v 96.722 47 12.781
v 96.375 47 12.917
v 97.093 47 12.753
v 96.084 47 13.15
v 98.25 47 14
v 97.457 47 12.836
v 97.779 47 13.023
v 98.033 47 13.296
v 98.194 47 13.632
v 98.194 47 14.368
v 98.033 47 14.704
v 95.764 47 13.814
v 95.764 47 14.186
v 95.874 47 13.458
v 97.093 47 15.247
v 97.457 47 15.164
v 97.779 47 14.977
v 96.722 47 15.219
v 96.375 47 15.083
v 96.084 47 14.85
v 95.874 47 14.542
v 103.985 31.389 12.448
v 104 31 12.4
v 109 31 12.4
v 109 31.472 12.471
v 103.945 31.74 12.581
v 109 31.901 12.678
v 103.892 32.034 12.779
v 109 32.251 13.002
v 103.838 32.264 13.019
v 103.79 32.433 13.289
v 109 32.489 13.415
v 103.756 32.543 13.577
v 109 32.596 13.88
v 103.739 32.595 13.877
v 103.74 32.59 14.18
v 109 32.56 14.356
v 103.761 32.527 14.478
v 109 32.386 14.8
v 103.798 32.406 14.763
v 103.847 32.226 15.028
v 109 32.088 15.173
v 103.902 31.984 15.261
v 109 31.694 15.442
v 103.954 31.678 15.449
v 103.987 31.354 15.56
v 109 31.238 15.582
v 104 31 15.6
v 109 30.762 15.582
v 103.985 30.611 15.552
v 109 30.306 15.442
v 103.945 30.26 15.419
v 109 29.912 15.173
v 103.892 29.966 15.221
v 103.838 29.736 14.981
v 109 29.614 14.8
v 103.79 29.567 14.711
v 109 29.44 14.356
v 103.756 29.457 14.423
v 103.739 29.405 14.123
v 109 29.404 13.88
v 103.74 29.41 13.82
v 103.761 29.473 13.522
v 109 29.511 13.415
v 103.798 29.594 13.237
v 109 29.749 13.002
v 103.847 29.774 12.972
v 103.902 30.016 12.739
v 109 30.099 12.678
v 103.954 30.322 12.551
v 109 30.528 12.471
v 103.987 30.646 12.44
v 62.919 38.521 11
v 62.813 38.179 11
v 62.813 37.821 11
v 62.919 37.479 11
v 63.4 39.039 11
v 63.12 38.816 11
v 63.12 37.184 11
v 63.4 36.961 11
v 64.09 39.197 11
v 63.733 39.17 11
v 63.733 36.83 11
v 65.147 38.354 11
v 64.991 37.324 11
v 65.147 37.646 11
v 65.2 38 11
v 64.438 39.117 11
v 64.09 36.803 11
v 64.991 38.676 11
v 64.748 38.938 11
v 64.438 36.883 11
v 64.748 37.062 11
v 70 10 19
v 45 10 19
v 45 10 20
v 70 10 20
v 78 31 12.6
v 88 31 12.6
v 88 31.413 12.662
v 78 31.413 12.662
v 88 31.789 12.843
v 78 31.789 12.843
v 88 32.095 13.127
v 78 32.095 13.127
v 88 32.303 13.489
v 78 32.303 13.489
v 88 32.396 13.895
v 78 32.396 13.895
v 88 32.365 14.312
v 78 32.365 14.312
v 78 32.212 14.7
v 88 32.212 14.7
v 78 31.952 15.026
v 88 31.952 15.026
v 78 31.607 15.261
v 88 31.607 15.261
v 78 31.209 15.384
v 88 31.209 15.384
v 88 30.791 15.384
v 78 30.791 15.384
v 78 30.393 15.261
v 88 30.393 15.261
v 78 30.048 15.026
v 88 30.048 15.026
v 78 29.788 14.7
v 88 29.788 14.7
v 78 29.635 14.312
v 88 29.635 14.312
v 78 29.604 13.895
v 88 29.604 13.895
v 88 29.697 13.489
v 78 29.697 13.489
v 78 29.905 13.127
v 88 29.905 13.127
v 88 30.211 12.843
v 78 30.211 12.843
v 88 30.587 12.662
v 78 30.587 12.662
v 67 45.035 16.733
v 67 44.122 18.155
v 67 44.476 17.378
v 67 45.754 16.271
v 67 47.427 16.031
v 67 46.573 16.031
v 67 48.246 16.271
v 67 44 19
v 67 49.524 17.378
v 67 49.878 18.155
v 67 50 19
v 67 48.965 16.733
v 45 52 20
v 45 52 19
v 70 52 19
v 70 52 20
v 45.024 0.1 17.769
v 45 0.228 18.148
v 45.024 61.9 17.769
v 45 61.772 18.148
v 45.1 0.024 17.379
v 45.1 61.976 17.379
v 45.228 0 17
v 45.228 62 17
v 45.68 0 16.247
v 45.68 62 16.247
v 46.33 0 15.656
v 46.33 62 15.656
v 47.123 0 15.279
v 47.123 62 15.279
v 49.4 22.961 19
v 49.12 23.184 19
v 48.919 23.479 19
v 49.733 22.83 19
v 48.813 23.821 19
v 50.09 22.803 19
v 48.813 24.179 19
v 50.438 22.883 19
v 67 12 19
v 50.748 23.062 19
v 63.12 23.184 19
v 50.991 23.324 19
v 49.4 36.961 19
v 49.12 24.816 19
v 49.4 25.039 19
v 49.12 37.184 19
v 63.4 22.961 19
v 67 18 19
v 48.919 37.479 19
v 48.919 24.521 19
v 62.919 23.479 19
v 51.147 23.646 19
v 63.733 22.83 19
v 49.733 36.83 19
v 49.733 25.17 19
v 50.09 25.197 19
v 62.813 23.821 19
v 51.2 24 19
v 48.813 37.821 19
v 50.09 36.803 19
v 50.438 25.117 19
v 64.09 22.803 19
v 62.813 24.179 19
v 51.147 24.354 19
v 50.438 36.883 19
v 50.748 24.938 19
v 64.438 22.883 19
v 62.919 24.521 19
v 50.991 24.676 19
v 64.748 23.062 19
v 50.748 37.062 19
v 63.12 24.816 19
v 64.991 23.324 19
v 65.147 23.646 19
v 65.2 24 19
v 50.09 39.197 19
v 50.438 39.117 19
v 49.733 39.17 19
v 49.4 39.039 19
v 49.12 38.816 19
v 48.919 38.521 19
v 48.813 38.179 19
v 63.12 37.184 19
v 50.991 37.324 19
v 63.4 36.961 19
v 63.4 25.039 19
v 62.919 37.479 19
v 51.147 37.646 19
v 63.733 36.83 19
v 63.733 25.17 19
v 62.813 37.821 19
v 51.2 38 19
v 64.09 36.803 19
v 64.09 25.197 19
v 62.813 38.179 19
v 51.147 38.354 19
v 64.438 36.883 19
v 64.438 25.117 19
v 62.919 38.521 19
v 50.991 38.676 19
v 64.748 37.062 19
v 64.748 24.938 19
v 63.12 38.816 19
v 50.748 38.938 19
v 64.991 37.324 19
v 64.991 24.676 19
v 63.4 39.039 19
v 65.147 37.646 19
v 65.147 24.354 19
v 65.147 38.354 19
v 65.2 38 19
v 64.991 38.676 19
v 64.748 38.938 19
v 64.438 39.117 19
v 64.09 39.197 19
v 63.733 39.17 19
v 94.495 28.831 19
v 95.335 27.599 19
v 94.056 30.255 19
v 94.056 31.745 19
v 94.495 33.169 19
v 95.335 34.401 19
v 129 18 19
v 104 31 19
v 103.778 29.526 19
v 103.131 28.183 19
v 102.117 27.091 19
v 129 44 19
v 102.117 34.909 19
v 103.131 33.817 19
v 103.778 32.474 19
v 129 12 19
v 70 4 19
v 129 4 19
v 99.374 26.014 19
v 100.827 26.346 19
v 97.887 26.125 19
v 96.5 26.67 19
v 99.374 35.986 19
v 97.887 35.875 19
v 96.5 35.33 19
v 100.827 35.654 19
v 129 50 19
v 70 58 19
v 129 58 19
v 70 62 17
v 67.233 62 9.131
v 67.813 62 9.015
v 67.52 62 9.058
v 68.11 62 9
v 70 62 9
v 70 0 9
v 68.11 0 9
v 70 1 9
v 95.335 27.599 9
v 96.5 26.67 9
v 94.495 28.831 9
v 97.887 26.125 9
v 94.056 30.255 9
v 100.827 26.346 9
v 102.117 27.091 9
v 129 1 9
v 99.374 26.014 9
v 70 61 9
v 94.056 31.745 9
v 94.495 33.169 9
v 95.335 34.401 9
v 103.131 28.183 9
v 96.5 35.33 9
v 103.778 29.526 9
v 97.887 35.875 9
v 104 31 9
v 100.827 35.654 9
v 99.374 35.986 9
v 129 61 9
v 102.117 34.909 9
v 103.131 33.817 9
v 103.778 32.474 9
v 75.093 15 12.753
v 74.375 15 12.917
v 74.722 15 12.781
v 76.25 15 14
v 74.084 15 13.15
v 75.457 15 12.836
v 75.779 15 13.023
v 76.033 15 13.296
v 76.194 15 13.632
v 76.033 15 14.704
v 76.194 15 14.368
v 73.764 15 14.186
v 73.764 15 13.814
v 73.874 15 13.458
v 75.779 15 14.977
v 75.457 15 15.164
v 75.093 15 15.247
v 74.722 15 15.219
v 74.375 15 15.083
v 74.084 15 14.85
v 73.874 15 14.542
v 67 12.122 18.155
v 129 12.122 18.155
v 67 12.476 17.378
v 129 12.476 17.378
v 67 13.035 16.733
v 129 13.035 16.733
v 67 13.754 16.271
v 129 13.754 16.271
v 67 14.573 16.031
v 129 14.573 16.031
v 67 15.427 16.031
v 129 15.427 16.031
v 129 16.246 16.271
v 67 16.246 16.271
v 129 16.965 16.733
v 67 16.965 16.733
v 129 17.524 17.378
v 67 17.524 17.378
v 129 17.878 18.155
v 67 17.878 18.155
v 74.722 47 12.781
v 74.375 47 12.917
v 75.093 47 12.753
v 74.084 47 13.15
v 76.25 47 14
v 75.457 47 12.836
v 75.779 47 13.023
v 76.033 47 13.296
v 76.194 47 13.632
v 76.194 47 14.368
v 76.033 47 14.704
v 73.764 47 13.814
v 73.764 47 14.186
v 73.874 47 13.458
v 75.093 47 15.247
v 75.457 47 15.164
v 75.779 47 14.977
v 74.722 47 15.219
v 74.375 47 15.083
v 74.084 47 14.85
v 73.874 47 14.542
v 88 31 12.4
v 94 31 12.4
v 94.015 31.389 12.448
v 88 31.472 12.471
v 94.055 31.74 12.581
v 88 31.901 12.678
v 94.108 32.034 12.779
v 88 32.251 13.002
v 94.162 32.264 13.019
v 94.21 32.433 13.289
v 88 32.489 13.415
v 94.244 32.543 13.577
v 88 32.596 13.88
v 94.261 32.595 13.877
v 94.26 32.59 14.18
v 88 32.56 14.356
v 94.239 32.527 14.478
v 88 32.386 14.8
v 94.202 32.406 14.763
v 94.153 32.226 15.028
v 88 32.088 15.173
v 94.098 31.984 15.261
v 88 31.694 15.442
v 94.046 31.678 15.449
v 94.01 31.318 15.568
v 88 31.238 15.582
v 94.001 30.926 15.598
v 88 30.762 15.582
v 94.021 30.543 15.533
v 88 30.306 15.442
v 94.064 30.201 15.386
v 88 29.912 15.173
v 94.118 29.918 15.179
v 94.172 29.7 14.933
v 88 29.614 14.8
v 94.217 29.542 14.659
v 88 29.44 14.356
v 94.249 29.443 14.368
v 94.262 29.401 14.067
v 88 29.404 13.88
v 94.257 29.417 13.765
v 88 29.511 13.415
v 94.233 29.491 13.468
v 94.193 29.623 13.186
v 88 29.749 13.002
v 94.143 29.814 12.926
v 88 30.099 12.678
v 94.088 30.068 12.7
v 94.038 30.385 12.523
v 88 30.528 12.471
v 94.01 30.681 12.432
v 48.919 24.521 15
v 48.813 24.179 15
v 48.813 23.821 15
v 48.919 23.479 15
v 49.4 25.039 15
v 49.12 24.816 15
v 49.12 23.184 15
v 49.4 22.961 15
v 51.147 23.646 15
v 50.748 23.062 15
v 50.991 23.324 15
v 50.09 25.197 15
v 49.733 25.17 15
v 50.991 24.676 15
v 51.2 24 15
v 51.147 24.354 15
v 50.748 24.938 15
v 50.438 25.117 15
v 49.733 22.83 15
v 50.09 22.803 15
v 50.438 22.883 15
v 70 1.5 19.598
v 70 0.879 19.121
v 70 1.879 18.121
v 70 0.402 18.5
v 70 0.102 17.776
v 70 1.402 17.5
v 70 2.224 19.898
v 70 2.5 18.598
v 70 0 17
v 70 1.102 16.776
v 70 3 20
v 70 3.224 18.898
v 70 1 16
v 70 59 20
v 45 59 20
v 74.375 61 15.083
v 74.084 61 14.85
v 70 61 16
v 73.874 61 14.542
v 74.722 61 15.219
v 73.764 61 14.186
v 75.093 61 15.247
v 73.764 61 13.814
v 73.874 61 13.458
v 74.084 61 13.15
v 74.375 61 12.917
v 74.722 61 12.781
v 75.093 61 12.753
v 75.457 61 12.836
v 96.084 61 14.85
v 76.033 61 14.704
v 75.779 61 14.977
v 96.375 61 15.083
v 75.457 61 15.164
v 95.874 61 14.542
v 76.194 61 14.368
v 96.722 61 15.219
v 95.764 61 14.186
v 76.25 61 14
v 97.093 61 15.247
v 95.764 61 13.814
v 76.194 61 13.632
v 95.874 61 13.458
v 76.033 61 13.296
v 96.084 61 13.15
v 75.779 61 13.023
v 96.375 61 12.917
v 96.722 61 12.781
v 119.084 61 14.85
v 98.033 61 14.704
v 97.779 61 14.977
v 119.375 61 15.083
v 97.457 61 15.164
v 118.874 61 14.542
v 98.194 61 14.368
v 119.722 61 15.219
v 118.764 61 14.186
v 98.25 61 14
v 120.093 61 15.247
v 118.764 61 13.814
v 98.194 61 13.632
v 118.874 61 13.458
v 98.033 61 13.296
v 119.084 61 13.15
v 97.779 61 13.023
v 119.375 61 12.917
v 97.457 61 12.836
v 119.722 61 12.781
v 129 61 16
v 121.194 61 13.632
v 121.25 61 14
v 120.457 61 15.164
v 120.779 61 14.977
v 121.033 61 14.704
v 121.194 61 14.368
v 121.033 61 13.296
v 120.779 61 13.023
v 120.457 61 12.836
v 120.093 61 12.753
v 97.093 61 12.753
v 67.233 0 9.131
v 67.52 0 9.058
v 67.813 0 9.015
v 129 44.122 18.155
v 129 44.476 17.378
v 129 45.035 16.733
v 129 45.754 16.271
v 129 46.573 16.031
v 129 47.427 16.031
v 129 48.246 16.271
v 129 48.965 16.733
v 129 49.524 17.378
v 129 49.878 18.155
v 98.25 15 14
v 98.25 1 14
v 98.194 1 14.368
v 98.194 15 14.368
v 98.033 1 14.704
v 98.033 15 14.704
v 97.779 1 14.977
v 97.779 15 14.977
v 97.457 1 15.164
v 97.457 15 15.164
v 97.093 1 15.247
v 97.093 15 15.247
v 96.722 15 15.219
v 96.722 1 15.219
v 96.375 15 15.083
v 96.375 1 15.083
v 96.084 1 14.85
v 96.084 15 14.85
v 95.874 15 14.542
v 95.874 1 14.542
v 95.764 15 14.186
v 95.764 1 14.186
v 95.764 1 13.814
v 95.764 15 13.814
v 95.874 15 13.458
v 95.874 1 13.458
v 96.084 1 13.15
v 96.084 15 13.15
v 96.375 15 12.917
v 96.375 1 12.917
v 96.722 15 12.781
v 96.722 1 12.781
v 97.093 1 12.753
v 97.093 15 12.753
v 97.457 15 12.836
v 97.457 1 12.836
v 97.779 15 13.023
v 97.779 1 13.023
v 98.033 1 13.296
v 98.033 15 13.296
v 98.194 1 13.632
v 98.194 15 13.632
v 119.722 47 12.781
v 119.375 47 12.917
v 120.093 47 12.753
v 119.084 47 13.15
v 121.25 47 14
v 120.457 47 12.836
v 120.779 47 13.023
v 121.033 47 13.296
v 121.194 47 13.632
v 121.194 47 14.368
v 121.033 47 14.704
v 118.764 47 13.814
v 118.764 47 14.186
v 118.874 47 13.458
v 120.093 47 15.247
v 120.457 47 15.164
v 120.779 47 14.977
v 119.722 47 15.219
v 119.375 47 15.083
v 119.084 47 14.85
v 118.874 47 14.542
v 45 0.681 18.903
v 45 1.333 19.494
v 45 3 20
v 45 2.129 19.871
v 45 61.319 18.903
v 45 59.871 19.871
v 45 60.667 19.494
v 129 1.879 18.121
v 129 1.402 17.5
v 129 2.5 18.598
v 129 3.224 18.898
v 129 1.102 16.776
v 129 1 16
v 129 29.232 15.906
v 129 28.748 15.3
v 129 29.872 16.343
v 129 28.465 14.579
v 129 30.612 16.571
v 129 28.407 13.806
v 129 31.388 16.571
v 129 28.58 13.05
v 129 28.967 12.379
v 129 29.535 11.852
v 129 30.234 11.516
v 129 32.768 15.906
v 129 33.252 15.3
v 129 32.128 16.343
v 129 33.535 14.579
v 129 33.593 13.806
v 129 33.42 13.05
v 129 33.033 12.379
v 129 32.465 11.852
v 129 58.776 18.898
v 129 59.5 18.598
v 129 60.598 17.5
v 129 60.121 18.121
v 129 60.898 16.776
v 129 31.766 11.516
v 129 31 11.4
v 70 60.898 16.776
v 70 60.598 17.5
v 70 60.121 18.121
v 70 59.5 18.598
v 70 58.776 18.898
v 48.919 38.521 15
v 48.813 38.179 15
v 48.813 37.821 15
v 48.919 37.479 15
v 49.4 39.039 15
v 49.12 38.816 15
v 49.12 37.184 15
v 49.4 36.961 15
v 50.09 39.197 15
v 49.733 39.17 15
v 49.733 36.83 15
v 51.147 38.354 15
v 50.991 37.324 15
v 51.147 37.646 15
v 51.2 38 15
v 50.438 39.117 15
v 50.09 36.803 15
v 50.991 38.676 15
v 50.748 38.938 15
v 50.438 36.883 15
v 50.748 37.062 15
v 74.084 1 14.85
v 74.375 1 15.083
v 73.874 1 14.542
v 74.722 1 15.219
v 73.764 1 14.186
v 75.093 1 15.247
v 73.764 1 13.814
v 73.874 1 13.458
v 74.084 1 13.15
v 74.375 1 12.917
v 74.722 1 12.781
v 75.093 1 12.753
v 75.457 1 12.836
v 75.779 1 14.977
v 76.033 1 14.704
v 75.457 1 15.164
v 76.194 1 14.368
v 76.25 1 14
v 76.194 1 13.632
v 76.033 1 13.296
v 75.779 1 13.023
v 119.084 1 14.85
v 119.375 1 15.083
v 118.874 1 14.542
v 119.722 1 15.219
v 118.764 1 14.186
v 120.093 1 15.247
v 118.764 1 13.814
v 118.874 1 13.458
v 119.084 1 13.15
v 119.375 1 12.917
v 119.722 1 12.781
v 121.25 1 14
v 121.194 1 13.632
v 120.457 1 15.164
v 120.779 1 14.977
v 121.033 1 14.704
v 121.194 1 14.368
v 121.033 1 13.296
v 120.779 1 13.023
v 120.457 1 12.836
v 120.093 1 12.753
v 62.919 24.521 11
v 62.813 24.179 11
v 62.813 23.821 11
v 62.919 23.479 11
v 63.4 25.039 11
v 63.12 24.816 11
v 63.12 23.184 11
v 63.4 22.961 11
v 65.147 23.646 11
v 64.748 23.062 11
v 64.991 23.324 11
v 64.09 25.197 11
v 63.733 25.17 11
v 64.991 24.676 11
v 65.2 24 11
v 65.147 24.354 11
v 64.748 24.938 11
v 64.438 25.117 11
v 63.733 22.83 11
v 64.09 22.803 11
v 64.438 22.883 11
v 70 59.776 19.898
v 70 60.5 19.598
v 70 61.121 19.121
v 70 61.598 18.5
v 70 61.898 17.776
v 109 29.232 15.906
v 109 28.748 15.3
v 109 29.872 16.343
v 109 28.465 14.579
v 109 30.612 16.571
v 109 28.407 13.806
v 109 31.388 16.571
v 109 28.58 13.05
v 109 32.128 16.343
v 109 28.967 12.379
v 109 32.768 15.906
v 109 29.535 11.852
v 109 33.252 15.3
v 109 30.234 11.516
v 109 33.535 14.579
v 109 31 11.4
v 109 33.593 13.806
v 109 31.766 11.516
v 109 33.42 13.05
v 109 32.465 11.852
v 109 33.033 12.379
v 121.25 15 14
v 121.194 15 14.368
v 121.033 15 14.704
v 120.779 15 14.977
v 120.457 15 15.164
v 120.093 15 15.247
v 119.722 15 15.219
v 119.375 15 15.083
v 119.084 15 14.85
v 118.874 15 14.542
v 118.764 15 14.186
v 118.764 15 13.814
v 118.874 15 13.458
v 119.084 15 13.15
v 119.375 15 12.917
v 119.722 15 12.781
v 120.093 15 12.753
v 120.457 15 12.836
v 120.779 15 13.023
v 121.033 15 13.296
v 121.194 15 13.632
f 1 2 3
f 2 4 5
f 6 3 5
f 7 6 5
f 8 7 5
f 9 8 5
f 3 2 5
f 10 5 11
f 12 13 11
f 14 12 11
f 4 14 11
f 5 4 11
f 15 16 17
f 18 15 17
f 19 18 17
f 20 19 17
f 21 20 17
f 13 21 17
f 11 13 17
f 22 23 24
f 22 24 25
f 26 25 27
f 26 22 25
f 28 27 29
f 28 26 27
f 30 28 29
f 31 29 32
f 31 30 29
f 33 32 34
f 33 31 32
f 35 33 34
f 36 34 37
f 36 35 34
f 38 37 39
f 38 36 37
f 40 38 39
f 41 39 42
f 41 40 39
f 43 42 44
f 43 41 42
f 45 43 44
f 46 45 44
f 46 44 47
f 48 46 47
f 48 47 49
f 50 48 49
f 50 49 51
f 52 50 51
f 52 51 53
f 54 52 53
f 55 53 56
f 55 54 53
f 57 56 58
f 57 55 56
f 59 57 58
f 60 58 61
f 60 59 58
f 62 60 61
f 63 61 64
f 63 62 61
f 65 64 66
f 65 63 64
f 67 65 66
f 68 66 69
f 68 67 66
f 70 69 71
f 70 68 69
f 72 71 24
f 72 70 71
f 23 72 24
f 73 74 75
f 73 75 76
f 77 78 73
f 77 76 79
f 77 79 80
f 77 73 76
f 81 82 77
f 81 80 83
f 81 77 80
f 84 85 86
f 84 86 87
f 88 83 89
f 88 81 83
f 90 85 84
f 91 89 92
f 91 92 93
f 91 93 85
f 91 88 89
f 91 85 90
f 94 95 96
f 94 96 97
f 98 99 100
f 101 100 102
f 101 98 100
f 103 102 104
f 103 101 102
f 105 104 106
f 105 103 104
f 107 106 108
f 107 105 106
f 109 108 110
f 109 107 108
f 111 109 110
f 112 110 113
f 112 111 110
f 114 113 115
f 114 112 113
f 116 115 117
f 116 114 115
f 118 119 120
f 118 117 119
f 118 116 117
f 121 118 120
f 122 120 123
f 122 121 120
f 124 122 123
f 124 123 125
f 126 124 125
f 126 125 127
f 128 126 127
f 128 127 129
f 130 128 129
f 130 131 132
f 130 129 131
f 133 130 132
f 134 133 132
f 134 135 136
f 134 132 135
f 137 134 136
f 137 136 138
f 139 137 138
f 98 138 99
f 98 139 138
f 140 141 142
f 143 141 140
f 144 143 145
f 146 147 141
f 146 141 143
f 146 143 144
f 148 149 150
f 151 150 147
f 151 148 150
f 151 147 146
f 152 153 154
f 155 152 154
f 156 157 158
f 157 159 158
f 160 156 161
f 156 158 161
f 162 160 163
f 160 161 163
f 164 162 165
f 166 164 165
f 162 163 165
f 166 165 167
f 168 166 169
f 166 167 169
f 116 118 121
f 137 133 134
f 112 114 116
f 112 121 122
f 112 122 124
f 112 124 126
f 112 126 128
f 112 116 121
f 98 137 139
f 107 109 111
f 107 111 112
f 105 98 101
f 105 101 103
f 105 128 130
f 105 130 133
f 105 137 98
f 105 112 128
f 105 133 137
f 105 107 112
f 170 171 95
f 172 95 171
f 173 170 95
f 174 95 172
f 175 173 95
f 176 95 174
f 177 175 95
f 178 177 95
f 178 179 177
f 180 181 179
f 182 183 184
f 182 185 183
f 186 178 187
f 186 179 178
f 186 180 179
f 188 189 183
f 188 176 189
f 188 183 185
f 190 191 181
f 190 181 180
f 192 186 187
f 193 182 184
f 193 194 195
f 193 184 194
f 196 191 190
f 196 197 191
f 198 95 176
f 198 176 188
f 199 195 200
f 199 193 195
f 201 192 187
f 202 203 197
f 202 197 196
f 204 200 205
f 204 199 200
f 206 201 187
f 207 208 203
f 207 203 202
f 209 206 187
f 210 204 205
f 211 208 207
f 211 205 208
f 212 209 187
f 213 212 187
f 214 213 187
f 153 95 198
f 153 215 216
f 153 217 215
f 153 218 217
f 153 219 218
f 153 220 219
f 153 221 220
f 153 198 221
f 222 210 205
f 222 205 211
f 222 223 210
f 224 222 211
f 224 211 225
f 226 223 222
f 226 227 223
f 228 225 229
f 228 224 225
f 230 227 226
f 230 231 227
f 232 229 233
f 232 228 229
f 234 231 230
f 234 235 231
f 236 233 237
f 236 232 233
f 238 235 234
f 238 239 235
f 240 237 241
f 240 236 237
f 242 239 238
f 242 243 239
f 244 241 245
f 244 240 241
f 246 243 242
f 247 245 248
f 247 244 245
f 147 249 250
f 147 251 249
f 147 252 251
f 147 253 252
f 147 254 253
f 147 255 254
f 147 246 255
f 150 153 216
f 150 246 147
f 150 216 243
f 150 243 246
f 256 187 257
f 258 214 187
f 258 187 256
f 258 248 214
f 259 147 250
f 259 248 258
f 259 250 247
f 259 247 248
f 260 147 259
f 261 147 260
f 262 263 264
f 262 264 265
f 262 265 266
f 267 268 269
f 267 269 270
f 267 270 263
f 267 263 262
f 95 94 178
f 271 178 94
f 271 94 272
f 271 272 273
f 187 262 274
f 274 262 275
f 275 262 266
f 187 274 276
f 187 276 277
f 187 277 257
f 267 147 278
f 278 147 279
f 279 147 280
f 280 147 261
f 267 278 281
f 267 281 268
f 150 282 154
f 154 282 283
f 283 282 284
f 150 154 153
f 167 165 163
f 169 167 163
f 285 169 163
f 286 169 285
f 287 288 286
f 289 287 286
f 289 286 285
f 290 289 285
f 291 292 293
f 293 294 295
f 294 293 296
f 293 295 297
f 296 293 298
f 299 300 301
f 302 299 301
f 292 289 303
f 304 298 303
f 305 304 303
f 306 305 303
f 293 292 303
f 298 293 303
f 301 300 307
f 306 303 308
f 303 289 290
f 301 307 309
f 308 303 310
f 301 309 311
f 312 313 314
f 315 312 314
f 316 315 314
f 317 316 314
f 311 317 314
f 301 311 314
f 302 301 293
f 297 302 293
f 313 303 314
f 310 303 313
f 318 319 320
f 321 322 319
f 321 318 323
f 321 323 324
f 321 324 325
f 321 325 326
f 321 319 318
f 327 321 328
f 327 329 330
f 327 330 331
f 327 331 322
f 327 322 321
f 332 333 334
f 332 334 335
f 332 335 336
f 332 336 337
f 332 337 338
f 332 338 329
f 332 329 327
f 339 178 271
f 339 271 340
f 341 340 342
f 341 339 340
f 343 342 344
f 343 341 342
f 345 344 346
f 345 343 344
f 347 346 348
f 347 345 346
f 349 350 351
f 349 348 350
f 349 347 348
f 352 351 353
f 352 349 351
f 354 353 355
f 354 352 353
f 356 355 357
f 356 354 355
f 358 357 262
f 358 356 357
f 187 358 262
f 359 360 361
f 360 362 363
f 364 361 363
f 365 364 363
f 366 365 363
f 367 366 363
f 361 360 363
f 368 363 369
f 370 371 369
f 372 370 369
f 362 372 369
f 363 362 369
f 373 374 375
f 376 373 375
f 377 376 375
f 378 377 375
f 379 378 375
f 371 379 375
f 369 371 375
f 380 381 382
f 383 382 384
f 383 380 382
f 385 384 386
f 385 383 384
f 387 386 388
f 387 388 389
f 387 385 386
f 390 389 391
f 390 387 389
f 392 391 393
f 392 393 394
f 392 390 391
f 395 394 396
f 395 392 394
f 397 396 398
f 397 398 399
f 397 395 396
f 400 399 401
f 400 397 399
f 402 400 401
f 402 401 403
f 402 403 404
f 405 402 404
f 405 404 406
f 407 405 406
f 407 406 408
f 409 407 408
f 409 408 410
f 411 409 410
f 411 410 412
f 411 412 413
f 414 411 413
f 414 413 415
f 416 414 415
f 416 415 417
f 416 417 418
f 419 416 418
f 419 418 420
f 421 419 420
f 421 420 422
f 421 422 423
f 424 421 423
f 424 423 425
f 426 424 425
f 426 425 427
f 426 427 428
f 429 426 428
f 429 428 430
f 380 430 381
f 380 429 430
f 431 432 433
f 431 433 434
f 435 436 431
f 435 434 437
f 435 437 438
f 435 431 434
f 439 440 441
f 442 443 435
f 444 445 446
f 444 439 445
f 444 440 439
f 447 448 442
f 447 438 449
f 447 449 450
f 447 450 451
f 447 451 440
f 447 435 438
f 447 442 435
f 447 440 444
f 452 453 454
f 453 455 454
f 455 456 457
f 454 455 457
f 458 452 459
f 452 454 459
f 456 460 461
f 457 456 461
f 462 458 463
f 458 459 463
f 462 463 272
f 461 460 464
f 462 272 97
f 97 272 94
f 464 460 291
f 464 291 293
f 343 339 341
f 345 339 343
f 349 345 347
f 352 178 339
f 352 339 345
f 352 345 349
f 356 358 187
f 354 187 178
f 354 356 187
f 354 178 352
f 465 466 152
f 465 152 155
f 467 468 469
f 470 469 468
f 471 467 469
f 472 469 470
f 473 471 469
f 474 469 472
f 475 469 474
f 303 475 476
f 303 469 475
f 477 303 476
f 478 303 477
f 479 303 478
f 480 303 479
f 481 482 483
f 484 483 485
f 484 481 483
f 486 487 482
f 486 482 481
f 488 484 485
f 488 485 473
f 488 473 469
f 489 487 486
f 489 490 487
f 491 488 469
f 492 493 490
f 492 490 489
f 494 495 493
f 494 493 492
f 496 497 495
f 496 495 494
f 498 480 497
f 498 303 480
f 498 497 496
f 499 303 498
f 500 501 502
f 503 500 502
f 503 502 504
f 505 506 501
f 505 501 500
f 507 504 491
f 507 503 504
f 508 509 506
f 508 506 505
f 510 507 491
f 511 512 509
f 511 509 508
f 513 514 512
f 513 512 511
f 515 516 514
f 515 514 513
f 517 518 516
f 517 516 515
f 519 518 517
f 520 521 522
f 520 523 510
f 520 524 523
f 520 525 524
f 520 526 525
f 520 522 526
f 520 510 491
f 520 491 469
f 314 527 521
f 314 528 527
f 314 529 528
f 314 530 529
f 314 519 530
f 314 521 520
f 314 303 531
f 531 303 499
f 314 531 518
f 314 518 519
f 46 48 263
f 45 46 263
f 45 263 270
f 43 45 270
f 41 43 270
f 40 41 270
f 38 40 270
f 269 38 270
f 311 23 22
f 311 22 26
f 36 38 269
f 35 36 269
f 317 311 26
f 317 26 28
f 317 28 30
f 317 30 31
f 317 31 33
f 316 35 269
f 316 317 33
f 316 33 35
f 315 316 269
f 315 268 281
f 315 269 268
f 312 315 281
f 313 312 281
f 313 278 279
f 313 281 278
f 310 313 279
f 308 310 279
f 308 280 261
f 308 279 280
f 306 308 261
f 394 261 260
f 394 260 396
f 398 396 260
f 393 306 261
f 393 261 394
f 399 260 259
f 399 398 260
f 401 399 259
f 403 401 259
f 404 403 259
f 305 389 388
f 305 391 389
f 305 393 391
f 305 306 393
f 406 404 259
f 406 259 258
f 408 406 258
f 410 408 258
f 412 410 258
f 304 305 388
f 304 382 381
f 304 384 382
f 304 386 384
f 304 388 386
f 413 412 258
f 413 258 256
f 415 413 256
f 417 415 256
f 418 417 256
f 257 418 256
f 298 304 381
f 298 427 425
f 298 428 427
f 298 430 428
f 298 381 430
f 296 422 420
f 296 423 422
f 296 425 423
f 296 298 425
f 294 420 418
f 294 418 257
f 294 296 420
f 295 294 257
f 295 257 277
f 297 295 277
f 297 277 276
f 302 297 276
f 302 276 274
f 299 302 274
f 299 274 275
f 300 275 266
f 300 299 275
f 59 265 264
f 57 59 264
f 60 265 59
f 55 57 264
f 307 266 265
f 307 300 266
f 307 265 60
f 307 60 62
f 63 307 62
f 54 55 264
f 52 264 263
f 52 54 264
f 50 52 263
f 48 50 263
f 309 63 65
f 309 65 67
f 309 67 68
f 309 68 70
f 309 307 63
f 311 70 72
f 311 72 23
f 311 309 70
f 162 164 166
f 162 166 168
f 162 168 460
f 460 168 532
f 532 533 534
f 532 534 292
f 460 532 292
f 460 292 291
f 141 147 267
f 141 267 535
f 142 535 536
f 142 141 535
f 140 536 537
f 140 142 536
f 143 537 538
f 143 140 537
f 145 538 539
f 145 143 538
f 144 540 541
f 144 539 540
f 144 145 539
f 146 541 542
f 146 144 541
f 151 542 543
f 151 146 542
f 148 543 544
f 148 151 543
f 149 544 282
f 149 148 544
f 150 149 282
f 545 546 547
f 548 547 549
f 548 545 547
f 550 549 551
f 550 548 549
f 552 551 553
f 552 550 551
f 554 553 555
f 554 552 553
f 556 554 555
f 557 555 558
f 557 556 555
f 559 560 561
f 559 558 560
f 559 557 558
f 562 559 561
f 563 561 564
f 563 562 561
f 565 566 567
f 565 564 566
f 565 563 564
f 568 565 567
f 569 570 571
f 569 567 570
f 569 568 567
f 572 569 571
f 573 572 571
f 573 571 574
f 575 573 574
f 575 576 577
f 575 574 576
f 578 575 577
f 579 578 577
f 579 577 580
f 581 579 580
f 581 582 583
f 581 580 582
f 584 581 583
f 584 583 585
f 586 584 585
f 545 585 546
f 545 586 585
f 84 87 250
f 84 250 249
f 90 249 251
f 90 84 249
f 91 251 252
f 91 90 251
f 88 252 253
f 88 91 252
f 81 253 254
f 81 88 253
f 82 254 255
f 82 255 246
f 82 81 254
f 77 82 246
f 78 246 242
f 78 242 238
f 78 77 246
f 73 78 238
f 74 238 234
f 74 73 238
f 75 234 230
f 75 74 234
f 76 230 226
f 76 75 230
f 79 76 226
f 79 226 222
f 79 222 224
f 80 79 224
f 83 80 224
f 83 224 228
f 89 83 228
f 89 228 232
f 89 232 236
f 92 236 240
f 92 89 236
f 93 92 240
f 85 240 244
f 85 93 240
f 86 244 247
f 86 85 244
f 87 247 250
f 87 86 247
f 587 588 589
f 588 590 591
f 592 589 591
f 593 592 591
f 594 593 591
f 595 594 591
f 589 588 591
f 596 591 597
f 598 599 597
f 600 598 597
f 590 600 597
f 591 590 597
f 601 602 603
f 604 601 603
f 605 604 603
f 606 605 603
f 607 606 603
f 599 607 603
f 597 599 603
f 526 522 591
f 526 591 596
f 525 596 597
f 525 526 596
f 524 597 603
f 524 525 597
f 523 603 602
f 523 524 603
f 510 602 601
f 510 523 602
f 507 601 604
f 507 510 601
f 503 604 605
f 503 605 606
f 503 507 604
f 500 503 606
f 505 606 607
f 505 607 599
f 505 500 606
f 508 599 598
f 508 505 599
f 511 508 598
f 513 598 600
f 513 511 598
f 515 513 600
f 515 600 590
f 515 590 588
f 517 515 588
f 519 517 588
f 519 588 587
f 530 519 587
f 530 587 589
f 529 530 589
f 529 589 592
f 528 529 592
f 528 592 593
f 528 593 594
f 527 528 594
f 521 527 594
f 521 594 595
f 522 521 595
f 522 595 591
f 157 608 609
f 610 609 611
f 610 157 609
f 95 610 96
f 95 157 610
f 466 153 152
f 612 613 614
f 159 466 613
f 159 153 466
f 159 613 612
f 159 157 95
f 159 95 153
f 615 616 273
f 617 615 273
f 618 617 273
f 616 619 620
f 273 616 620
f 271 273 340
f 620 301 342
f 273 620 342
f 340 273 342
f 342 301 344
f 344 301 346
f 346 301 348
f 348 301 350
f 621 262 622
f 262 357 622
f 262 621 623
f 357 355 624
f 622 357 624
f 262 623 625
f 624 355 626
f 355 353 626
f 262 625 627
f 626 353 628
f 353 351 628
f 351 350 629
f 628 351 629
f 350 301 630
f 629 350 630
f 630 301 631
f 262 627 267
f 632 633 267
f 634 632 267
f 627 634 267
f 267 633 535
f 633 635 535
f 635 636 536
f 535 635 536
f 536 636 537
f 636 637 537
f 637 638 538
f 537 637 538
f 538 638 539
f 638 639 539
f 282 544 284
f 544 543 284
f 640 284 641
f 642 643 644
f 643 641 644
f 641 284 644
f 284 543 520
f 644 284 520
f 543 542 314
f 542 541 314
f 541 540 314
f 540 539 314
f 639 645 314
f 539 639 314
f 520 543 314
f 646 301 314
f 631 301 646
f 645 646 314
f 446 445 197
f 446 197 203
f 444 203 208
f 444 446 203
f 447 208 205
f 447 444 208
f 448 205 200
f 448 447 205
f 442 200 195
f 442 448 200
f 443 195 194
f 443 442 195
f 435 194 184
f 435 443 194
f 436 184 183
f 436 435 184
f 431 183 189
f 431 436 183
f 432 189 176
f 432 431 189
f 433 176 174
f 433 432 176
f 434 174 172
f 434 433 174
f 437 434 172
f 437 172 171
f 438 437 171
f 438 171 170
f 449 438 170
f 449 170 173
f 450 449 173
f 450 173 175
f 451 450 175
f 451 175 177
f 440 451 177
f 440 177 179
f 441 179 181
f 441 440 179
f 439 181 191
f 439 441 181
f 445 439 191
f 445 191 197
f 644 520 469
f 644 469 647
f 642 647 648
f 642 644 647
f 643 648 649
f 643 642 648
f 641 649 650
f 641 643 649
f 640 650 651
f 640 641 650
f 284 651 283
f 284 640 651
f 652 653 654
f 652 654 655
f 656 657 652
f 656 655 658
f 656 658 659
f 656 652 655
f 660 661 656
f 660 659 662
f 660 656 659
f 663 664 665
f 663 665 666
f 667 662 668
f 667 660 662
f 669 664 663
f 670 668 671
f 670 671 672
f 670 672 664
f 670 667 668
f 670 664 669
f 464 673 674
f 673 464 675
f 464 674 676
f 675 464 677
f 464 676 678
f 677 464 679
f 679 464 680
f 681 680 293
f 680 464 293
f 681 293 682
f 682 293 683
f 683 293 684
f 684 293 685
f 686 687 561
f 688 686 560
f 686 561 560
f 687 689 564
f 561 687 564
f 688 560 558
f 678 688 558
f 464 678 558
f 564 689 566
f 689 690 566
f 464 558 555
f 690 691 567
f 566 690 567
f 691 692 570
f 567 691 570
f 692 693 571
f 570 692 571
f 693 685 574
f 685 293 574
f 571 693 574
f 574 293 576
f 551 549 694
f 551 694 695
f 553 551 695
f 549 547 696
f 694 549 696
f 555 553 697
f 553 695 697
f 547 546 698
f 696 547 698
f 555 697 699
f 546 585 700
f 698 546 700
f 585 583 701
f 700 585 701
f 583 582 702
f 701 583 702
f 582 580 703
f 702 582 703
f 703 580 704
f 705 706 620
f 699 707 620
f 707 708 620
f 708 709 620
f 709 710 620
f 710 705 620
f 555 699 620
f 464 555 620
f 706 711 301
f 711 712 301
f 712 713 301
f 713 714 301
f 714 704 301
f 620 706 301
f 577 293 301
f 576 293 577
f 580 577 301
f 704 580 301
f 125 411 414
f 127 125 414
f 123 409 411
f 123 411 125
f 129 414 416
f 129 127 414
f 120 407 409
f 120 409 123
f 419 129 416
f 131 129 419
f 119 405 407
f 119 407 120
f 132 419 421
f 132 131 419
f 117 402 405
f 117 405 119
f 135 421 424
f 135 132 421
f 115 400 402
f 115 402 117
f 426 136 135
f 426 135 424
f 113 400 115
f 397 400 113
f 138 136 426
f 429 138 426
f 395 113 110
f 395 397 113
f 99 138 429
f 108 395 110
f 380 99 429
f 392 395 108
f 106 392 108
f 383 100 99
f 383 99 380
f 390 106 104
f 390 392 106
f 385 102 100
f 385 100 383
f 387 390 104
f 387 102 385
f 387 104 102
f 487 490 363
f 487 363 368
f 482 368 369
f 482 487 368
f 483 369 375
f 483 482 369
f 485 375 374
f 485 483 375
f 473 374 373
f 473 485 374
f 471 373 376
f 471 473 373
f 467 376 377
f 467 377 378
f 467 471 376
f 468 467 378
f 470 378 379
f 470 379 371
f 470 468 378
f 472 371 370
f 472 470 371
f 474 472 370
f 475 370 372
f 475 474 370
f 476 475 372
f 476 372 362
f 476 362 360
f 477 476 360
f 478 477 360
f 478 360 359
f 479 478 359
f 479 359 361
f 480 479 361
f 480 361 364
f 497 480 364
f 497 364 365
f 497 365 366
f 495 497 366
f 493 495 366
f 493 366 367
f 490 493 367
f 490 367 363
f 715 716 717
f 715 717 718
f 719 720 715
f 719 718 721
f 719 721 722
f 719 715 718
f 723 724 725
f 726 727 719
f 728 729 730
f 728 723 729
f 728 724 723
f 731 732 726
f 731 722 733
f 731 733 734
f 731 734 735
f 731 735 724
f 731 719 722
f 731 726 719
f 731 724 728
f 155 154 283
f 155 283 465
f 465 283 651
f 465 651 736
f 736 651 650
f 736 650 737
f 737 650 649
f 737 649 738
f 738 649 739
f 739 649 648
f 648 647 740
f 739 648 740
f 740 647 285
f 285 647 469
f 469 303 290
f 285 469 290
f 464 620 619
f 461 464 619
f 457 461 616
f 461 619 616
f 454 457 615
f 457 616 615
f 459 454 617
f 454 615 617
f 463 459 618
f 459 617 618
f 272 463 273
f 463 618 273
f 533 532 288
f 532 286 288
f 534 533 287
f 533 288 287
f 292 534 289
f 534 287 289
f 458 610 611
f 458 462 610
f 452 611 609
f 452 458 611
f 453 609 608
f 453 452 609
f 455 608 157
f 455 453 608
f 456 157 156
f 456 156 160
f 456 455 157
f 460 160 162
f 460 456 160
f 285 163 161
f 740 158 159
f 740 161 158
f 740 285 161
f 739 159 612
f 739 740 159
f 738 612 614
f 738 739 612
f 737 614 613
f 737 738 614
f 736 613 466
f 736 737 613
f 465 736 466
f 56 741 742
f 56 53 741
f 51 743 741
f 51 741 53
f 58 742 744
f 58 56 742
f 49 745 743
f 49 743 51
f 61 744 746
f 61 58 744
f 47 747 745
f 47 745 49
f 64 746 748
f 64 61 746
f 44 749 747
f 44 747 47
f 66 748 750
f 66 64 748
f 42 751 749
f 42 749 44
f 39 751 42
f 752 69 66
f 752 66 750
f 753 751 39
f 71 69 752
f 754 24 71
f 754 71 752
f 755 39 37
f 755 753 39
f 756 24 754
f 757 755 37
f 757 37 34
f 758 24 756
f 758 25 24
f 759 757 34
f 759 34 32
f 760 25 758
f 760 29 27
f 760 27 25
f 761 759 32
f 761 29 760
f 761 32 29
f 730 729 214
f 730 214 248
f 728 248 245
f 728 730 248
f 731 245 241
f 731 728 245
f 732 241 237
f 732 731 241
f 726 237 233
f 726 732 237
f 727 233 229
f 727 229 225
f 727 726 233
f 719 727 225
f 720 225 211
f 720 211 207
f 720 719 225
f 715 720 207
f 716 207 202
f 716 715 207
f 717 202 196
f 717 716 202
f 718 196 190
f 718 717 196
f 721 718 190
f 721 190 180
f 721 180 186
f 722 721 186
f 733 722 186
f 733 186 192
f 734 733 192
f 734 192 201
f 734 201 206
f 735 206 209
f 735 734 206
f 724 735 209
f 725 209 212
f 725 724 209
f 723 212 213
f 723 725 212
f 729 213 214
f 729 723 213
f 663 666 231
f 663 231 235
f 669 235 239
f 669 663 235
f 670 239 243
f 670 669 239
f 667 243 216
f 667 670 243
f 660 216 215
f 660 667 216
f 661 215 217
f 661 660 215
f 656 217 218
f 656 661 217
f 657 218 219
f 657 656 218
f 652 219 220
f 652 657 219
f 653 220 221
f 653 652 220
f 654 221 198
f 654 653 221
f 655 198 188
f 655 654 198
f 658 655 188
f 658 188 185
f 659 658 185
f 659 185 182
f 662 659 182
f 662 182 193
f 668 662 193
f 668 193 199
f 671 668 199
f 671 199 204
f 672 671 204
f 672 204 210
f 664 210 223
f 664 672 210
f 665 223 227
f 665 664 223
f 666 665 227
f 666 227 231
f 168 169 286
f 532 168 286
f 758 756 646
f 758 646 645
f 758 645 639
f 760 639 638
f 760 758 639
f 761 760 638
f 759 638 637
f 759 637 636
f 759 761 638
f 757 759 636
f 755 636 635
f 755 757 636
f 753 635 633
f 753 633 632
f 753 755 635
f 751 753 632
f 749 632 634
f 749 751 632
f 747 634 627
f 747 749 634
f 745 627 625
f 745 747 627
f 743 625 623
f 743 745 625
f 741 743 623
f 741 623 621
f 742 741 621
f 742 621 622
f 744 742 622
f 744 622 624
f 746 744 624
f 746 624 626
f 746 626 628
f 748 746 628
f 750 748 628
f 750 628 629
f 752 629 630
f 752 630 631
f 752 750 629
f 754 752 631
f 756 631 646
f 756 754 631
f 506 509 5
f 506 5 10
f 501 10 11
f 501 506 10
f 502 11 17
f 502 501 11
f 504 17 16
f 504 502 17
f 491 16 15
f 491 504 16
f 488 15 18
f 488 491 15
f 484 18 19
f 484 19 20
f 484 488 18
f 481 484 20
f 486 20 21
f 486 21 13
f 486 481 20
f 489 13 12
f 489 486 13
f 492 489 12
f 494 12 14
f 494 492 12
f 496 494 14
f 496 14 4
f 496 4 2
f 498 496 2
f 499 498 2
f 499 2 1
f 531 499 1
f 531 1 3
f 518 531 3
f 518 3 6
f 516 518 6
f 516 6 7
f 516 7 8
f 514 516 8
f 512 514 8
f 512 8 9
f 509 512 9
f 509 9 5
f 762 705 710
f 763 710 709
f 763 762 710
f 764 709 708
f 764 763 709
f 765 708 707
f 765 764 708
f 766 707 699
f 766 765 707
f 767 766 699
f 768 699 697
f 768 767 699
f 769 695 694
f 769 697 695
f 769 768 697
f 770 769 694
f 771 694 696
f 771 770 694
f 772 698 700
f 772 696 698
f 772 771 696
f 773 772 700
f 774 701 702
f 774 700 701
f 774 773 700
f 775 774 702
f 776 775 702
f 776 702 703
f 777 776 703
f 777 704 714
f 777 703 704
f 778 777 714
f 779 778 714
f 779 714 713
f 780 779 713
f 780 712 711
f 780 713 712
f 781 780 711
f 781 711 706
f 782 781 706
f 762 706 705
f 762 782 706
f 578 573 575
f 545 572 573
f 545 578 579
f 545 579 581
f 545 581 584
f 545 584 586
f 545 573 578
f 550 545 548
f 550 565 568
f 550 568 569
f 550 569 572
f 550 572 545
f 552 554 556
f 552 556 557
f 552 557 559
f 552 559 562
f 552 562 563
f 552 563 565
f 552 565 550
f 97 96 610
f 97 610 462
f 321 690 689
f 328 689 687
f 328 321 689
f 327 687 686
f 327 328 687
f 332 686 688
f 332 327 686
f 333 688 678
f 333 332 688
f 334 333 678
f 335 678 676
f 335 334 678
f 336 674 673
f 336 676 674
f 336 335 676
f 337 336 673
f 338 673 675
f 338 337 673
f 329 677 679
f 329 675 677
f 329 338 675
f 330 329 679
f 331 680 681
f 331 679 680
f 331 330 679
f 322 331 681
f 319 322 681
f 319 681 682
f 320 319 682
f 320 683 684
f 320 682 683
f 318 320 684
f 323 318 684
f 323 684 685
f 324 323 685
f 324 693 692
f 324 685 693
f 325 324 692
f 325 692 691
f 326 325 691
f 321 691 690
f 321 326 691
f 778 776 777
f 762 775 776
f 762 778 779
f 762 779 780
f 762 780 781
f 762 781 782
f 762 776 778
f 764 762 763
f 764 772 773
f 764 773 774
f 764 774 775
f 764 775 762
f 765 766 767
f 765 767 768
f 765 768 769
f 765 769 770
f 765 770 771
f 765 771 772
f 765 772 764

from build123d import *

# Parameters (mm, degrees)
CYLINDER178_R          = 3
CYLINDER178_DEPTH      = 62
CYLINDER179_R          = 3
CYLINDER179_DEPTH      = 62
CYLINDER174_R          = 1.2
CYLINDER174_DEPTH      = 4
CYLINDER176_R          = 1.2
CYLINDER176_DEPTH      = 8
CYLINDER177_R          = 1.2
CYLINDER177_DEPTH      = 8
CYLINDER175_R          = 1.2
CYLINDER175_DEPTH      = 4
CYLINDER002_R          = 1.6
CYLINDER002_DEPTH      = 41
CYLINDER003_R          = 2.6
CYLINDER003_DEPTH      = 20
CYLINDER001_R          = 1.4
CYLINDER001_DEPTH      = 51
CYLINDER008_R          = 1.25
CYLINDER008_DEPTH      = 15
CYLINDER007_R          = 1.25
CYLINDER007_DEPTH      = 15
CYLINDER009_R          = 1.25
CYLINDER009_DEPTH      = 15
CYLINDER005_R          = 1.25
CYLINDER005_DEPTH      = 15
CYLINDER006_R          = 1.25
CYLINDER006_DEPTH      = 15
CYLINDER004_R          = 1.25
CYLINDER004_DEPTH      = 15
CYLINDER_R             = 5
CYLINDER_DEPTH         = 19
BOX084_W               = 30
BOX084_H               = 62
BOX084_DEPTH           = 10
BOX084_PLACEMENT_ANGLE = 17
BOX083_W               = 25
BOX083_H               = 42
BOX083_DEPTH           = 1.5
BOX079_W               = 25
BOX079_H               = 62
BOX079_DEPTH           = 11
FILLET045_R            = 3
BOX008_W               = 60
BOX008_H               = 60
BOX008_DEPTH           = 10
FILLET044_R            = 3
FILLET046_R            = 3


with BuildPart() as cylinder178:
    # Cylinder178 → Cylinder178 (new body)
    with BuildSketch(Plane(origin=(67, 15, 19), x_dir=(0, 0, -1), z_dir=(1, 0, 0))):
        Circle(CYLINDER178_R)
    extrude(amount=CYLINDER178_DEPTH)


with BuildPart() as fusion154:
    # Cylinder179 → Cylinder179 (new body)
    with BuildSketch(Plane(origin=(67, 47, 19), x_dir=(0, 0, -1), z_dir=(1, 0, 0))):
        Circle(CYLINDER179_R)
    extrude(amount=CYLINDER179_DEPTH)

    # Fusion154: union Cylinder178
    add(cylinder178.part)


with BuildPart() as cylinder174:
    # Cylinder174 → Cylinder174 (new body)
    with BuildSketch(Plane(origin=(50, 24, 15), x_dir=(1, 0, 0), z_dir=(0, 0, 1))):
        Circle(CYLINDER174_R)
    extrude(amount=CYLINDER174_DEPTH)


with BuildPart() as cylinder176:
    # Cylinder176 → Cylinder176 (new body)
    with BuildSketch(Plane(origin=(64, 24, 11), x_dir=(1, 0, 0), z_dir=(0, 0, 1))):
        Circle(CYLINDER176_R)
    extrude(amount=CYLINDER176_DEPTH)


with BuildPart() as cylinder177:
    # Cylinder177 → Cylinder177 (new body)
    with BuildSketch(Plane(origin=(64, 38, 11), x_dir=(1, 0, 0), z_dir=(0, 0, 1))):
        Circle(CYLINDER177_R)
    extrude(amount=CYLINDER177_DEPTH)


with BuildPart() as fusion153:
    # Cylinder175 → Cylinder175 (new body)
    with BuildSketch(Plane(origin=(50, 38, 15), x_dir=(1, 0, 0), z_dir=(0, 0, 1))):
        Circle(CYLINDER175_R)
    extrude(amount=CYLINDER175_DEPTH)

    # Fusion153: union Cylinder174, Cylinder176, Cylinder177
    add(cylinder174.part)
    add(cylinder176.part)
    add(cylinder177.part)


with BuildPart() as cylinder002:
    # Cylinder002 → Cylinder002 (new body)
    with BuildSketch(Plane(origin=(20, 31, 10), x_dir=(0, 0, -1), z_dir=(1, 0, 0))):
        Circle(CYLINDER002_R)
    extrude(amount=CYLINDER002_DEPTH)


with BuildPart() as cylinder003:
    # Cylinder003 → Cylinder003 (new body)
    with BuildSketch(Plane(origin=(41, 31, 10), x_dir=(0, 0, -1), z_dir=(1, 0, 0))):
        Circle(CYLINDER003_R)
    extrude(amount=CYLINDER003_DEPTH)


with BuildPart() as fusion149:
    # Cylinder001 → Cylinder001 (new body)
    with BuildSketch(Plane(origin=(10, 31, 10), x_dir=(0, 0, -1), z_dir=(1, 0, 0))):
        Circle(CYLINDER001_R)
    extrude(amount=CYLINDER001_DEPTH)

    # Fusion149: union Cylinder002, Cylinder003
    add(cylinder002.part)
    add(cylinder003.part)


with BuildPart() as fusion149_1:
    # Fusion149 placement: moved
    add(fusion149.part.moved(Location((-1, 0, 4))))


with BuildPart() as cylinder008:
    # Cylinder008 → Cylinder008 (new body)
    with BuildSketch(Plane(origin=(6, 15, 14), x_dir=(1, 0, 0), z_dir=(0, -1, 0))):
        Circle(CYLINDER008_R)
    extrude(amount=CYLINDER008_DEPTH)


with BuildPart() as cylinder007:
    # Cylinder007 → Cylinder007 (new body)
    with BuildSketch(Plane(origin=(28, 15, 14), x_dir=(1, 0, 0), z_dir=(0, -1, 0))):
        Circle(CYLINDER007_R)
    extrude(amount=CYLINDER007_DEPTH)


with BuildPart() as fusion008:
    # Cylinder009 → Cylinder009 (new body)
    with BuildSketch(Plane(origin=(51, 15, 14), x_dir=(1, 0, 0), z_dir=(0, -1, 0))):
        Circle(CYLINDER009_R)
    extrude(amount=CYLINDER009_DEPTH)

    # Fusion008: union Cylinder008, Cylinder007
    add(cylinder008.part)
    add(cylinder007.part)


with BuildPart() as fusion008_1:
    # Fusion008 placement: moved
    add(fusion008.part.moved(Location((0, 47, 0))))


with BuildPart() as cylinder005:
    # Cylinder005 → Cylinder005 (new body)
    with BuildSketch(Plane(origin=(6, 15, 14), x_dir=(1, 0, 0), z_dir=(0, -1, 0))):
        Circle(CYLINDER005_R)
    extrude(amount=CYLINDER005_DEPTH)


with BuildPart() as cylinder006:
    # Cylinder006 → Cylinder006 (new body)
    with BuildSketch(Plane(origin=(28, 15, 14), x_dir=(1, 0, 0), z_dir=(0, -1, 0))):
        Circle(CYLINDER006_R)
    extrude(amount=CYLINDER006_DEPTH)


with BuildPart() as fusion009:
    # Cylinder004 → Cylinder004 (new body)
    with BuildSketch(Plane(origin=(51, 15, 14), x_dir=(1, 0, 0), z_dir=(0, -1, 0))):
        Circle(CYLINDER004_R)
    extrude(amount=CYLINDER004_DEPTH)

    # Fusion007: union Cylinder005, Cylinder006
    add(cylinder005.part)
    add(cylinder006.part)

    # Fusion009: union Fusion008
    add(fusion008_1.part)


with BuildPart() as cylinder:
    # Cylinder → Cylinder (new body)
    with BuildSketch(Plane(origin=(30, 31, 6), x_dir=(1, 0, 0), z_dir=(0, 0, 1))):
        Circle(CYLINDER_R)
    extrude(amount=CYLINDER_DEPTH)


with BuildPart() as cube052:
    # Box084 → Box084 (new body)
    with BuildSketch(Plane.XY):
        with Locations((15, 31)):
            Rectangle(BOX084_W, BOX084_H)
    extrude(amount=BOX084_DEPTH)


with BuildPart() as cube052_1:
    # Box084 placement: moved
    add(cube052.part.moved(Location((-29, 0, 7))).rotate(Axis((-29, 0, 7), (0, 1, 0)), BOX084_PLACEMENT_ANGLE))


with BuildPart() as cube051:
    # Box083 → Box083 (new body)
    with BuildSketch(Plane(origin=(-24, 10, 19), x_dir=(1, 0, 0), z_dir=(0, 0, 1))):
        with Locations((12.5, 21)):
            Rectangle(BOX083_W, BOX083_H)
    extrude(amount=BOX083_DEPTH)


with BuildPart() as fillet045:
    # Box079 → Box079 (new body)
    with BuildSketch(Plane(origin=(-24, 0, 9), x_dir=(1, 0, 0), z_dir=(0, 0, 1))):
        with Locations((12.5, 31)):
            Rectangle(BOX079_W, BOX079_H)
    extrude(amount=BOX079_DEPTH)

    # Cut098: cut Cube051
    add(cube051.part, mode=Mode.SUBTRACT)

    # Fillet045
    fillet045_edges = [fillet045.edges().sort_by_distance(p)[0] for p in [
        (-11.5, 0, 20),
        (-11.5, 62, 20),
    ]]
    fillet(fillet045_edges, radius=FILLET045_R)


with BuildPart() as fifth_wheel_plate:
    # Box008 → Box008 (new body)
    with BuildSketch(Plane(origin=(0, 1, 9), x_dir=(1, 0, 0), z_dir=(0, 0, 1))):
        with Locations((30, 30)):
            Rectangle(BOX008_W, BOX008_H)
    extrude(amount=BOX008_DEPTH)

    # Fillet044
    fillet044_edges = [fifth_wheel_plate.edges().sort_by_distance(p)[0] for p in [
        (30, 1, 19),
        (30, 61, 19),
    ]]
    fillet(fillet044_edges, radius=FILLET044_R)

    # Fusion150: union Fillet045
    add(fillet045.part)

    # Cut099: cut Cube052
    add(cube052_1.part, mode=Mode.SUBTRACT)

    # Cut100: cut Cylinder
    add(cylinder.part, mode=Mode.SUBTRACT)

    # Cut101: cut Fusion009
    add(fusion009.part, mode=Mode.SUBTRACT)

    # Cut102: cut Fusion149
    add(fusion149_1.part, mode=Mode.SUBTRACT)

    # Fillet046
    fillet046_edges = [fifth_wheel_plate.edges().sort_by_distance(p)[0] for p in [
        (-1.338669, 31, 9),
        (-24, 31, 15.928264),
    ]]
    fillet(fillet046_edges, radius=FILLET046_R)


with BuildPart() as fifth_wheel_plate_1:
    # Fillet046 placement: moved
    add(fifth_wheel_plate.part.moved(Location((69, 0, 0))))

    # Cut109: cut Fusion153
    add(fusion153.part, mode=Mode.SUBTRACT)

    # Cut111: cut Fusion154
    add(fusion154.part, mode=Mode.SUBTRACT)


solid = fifth_wheel_plate_1.part
